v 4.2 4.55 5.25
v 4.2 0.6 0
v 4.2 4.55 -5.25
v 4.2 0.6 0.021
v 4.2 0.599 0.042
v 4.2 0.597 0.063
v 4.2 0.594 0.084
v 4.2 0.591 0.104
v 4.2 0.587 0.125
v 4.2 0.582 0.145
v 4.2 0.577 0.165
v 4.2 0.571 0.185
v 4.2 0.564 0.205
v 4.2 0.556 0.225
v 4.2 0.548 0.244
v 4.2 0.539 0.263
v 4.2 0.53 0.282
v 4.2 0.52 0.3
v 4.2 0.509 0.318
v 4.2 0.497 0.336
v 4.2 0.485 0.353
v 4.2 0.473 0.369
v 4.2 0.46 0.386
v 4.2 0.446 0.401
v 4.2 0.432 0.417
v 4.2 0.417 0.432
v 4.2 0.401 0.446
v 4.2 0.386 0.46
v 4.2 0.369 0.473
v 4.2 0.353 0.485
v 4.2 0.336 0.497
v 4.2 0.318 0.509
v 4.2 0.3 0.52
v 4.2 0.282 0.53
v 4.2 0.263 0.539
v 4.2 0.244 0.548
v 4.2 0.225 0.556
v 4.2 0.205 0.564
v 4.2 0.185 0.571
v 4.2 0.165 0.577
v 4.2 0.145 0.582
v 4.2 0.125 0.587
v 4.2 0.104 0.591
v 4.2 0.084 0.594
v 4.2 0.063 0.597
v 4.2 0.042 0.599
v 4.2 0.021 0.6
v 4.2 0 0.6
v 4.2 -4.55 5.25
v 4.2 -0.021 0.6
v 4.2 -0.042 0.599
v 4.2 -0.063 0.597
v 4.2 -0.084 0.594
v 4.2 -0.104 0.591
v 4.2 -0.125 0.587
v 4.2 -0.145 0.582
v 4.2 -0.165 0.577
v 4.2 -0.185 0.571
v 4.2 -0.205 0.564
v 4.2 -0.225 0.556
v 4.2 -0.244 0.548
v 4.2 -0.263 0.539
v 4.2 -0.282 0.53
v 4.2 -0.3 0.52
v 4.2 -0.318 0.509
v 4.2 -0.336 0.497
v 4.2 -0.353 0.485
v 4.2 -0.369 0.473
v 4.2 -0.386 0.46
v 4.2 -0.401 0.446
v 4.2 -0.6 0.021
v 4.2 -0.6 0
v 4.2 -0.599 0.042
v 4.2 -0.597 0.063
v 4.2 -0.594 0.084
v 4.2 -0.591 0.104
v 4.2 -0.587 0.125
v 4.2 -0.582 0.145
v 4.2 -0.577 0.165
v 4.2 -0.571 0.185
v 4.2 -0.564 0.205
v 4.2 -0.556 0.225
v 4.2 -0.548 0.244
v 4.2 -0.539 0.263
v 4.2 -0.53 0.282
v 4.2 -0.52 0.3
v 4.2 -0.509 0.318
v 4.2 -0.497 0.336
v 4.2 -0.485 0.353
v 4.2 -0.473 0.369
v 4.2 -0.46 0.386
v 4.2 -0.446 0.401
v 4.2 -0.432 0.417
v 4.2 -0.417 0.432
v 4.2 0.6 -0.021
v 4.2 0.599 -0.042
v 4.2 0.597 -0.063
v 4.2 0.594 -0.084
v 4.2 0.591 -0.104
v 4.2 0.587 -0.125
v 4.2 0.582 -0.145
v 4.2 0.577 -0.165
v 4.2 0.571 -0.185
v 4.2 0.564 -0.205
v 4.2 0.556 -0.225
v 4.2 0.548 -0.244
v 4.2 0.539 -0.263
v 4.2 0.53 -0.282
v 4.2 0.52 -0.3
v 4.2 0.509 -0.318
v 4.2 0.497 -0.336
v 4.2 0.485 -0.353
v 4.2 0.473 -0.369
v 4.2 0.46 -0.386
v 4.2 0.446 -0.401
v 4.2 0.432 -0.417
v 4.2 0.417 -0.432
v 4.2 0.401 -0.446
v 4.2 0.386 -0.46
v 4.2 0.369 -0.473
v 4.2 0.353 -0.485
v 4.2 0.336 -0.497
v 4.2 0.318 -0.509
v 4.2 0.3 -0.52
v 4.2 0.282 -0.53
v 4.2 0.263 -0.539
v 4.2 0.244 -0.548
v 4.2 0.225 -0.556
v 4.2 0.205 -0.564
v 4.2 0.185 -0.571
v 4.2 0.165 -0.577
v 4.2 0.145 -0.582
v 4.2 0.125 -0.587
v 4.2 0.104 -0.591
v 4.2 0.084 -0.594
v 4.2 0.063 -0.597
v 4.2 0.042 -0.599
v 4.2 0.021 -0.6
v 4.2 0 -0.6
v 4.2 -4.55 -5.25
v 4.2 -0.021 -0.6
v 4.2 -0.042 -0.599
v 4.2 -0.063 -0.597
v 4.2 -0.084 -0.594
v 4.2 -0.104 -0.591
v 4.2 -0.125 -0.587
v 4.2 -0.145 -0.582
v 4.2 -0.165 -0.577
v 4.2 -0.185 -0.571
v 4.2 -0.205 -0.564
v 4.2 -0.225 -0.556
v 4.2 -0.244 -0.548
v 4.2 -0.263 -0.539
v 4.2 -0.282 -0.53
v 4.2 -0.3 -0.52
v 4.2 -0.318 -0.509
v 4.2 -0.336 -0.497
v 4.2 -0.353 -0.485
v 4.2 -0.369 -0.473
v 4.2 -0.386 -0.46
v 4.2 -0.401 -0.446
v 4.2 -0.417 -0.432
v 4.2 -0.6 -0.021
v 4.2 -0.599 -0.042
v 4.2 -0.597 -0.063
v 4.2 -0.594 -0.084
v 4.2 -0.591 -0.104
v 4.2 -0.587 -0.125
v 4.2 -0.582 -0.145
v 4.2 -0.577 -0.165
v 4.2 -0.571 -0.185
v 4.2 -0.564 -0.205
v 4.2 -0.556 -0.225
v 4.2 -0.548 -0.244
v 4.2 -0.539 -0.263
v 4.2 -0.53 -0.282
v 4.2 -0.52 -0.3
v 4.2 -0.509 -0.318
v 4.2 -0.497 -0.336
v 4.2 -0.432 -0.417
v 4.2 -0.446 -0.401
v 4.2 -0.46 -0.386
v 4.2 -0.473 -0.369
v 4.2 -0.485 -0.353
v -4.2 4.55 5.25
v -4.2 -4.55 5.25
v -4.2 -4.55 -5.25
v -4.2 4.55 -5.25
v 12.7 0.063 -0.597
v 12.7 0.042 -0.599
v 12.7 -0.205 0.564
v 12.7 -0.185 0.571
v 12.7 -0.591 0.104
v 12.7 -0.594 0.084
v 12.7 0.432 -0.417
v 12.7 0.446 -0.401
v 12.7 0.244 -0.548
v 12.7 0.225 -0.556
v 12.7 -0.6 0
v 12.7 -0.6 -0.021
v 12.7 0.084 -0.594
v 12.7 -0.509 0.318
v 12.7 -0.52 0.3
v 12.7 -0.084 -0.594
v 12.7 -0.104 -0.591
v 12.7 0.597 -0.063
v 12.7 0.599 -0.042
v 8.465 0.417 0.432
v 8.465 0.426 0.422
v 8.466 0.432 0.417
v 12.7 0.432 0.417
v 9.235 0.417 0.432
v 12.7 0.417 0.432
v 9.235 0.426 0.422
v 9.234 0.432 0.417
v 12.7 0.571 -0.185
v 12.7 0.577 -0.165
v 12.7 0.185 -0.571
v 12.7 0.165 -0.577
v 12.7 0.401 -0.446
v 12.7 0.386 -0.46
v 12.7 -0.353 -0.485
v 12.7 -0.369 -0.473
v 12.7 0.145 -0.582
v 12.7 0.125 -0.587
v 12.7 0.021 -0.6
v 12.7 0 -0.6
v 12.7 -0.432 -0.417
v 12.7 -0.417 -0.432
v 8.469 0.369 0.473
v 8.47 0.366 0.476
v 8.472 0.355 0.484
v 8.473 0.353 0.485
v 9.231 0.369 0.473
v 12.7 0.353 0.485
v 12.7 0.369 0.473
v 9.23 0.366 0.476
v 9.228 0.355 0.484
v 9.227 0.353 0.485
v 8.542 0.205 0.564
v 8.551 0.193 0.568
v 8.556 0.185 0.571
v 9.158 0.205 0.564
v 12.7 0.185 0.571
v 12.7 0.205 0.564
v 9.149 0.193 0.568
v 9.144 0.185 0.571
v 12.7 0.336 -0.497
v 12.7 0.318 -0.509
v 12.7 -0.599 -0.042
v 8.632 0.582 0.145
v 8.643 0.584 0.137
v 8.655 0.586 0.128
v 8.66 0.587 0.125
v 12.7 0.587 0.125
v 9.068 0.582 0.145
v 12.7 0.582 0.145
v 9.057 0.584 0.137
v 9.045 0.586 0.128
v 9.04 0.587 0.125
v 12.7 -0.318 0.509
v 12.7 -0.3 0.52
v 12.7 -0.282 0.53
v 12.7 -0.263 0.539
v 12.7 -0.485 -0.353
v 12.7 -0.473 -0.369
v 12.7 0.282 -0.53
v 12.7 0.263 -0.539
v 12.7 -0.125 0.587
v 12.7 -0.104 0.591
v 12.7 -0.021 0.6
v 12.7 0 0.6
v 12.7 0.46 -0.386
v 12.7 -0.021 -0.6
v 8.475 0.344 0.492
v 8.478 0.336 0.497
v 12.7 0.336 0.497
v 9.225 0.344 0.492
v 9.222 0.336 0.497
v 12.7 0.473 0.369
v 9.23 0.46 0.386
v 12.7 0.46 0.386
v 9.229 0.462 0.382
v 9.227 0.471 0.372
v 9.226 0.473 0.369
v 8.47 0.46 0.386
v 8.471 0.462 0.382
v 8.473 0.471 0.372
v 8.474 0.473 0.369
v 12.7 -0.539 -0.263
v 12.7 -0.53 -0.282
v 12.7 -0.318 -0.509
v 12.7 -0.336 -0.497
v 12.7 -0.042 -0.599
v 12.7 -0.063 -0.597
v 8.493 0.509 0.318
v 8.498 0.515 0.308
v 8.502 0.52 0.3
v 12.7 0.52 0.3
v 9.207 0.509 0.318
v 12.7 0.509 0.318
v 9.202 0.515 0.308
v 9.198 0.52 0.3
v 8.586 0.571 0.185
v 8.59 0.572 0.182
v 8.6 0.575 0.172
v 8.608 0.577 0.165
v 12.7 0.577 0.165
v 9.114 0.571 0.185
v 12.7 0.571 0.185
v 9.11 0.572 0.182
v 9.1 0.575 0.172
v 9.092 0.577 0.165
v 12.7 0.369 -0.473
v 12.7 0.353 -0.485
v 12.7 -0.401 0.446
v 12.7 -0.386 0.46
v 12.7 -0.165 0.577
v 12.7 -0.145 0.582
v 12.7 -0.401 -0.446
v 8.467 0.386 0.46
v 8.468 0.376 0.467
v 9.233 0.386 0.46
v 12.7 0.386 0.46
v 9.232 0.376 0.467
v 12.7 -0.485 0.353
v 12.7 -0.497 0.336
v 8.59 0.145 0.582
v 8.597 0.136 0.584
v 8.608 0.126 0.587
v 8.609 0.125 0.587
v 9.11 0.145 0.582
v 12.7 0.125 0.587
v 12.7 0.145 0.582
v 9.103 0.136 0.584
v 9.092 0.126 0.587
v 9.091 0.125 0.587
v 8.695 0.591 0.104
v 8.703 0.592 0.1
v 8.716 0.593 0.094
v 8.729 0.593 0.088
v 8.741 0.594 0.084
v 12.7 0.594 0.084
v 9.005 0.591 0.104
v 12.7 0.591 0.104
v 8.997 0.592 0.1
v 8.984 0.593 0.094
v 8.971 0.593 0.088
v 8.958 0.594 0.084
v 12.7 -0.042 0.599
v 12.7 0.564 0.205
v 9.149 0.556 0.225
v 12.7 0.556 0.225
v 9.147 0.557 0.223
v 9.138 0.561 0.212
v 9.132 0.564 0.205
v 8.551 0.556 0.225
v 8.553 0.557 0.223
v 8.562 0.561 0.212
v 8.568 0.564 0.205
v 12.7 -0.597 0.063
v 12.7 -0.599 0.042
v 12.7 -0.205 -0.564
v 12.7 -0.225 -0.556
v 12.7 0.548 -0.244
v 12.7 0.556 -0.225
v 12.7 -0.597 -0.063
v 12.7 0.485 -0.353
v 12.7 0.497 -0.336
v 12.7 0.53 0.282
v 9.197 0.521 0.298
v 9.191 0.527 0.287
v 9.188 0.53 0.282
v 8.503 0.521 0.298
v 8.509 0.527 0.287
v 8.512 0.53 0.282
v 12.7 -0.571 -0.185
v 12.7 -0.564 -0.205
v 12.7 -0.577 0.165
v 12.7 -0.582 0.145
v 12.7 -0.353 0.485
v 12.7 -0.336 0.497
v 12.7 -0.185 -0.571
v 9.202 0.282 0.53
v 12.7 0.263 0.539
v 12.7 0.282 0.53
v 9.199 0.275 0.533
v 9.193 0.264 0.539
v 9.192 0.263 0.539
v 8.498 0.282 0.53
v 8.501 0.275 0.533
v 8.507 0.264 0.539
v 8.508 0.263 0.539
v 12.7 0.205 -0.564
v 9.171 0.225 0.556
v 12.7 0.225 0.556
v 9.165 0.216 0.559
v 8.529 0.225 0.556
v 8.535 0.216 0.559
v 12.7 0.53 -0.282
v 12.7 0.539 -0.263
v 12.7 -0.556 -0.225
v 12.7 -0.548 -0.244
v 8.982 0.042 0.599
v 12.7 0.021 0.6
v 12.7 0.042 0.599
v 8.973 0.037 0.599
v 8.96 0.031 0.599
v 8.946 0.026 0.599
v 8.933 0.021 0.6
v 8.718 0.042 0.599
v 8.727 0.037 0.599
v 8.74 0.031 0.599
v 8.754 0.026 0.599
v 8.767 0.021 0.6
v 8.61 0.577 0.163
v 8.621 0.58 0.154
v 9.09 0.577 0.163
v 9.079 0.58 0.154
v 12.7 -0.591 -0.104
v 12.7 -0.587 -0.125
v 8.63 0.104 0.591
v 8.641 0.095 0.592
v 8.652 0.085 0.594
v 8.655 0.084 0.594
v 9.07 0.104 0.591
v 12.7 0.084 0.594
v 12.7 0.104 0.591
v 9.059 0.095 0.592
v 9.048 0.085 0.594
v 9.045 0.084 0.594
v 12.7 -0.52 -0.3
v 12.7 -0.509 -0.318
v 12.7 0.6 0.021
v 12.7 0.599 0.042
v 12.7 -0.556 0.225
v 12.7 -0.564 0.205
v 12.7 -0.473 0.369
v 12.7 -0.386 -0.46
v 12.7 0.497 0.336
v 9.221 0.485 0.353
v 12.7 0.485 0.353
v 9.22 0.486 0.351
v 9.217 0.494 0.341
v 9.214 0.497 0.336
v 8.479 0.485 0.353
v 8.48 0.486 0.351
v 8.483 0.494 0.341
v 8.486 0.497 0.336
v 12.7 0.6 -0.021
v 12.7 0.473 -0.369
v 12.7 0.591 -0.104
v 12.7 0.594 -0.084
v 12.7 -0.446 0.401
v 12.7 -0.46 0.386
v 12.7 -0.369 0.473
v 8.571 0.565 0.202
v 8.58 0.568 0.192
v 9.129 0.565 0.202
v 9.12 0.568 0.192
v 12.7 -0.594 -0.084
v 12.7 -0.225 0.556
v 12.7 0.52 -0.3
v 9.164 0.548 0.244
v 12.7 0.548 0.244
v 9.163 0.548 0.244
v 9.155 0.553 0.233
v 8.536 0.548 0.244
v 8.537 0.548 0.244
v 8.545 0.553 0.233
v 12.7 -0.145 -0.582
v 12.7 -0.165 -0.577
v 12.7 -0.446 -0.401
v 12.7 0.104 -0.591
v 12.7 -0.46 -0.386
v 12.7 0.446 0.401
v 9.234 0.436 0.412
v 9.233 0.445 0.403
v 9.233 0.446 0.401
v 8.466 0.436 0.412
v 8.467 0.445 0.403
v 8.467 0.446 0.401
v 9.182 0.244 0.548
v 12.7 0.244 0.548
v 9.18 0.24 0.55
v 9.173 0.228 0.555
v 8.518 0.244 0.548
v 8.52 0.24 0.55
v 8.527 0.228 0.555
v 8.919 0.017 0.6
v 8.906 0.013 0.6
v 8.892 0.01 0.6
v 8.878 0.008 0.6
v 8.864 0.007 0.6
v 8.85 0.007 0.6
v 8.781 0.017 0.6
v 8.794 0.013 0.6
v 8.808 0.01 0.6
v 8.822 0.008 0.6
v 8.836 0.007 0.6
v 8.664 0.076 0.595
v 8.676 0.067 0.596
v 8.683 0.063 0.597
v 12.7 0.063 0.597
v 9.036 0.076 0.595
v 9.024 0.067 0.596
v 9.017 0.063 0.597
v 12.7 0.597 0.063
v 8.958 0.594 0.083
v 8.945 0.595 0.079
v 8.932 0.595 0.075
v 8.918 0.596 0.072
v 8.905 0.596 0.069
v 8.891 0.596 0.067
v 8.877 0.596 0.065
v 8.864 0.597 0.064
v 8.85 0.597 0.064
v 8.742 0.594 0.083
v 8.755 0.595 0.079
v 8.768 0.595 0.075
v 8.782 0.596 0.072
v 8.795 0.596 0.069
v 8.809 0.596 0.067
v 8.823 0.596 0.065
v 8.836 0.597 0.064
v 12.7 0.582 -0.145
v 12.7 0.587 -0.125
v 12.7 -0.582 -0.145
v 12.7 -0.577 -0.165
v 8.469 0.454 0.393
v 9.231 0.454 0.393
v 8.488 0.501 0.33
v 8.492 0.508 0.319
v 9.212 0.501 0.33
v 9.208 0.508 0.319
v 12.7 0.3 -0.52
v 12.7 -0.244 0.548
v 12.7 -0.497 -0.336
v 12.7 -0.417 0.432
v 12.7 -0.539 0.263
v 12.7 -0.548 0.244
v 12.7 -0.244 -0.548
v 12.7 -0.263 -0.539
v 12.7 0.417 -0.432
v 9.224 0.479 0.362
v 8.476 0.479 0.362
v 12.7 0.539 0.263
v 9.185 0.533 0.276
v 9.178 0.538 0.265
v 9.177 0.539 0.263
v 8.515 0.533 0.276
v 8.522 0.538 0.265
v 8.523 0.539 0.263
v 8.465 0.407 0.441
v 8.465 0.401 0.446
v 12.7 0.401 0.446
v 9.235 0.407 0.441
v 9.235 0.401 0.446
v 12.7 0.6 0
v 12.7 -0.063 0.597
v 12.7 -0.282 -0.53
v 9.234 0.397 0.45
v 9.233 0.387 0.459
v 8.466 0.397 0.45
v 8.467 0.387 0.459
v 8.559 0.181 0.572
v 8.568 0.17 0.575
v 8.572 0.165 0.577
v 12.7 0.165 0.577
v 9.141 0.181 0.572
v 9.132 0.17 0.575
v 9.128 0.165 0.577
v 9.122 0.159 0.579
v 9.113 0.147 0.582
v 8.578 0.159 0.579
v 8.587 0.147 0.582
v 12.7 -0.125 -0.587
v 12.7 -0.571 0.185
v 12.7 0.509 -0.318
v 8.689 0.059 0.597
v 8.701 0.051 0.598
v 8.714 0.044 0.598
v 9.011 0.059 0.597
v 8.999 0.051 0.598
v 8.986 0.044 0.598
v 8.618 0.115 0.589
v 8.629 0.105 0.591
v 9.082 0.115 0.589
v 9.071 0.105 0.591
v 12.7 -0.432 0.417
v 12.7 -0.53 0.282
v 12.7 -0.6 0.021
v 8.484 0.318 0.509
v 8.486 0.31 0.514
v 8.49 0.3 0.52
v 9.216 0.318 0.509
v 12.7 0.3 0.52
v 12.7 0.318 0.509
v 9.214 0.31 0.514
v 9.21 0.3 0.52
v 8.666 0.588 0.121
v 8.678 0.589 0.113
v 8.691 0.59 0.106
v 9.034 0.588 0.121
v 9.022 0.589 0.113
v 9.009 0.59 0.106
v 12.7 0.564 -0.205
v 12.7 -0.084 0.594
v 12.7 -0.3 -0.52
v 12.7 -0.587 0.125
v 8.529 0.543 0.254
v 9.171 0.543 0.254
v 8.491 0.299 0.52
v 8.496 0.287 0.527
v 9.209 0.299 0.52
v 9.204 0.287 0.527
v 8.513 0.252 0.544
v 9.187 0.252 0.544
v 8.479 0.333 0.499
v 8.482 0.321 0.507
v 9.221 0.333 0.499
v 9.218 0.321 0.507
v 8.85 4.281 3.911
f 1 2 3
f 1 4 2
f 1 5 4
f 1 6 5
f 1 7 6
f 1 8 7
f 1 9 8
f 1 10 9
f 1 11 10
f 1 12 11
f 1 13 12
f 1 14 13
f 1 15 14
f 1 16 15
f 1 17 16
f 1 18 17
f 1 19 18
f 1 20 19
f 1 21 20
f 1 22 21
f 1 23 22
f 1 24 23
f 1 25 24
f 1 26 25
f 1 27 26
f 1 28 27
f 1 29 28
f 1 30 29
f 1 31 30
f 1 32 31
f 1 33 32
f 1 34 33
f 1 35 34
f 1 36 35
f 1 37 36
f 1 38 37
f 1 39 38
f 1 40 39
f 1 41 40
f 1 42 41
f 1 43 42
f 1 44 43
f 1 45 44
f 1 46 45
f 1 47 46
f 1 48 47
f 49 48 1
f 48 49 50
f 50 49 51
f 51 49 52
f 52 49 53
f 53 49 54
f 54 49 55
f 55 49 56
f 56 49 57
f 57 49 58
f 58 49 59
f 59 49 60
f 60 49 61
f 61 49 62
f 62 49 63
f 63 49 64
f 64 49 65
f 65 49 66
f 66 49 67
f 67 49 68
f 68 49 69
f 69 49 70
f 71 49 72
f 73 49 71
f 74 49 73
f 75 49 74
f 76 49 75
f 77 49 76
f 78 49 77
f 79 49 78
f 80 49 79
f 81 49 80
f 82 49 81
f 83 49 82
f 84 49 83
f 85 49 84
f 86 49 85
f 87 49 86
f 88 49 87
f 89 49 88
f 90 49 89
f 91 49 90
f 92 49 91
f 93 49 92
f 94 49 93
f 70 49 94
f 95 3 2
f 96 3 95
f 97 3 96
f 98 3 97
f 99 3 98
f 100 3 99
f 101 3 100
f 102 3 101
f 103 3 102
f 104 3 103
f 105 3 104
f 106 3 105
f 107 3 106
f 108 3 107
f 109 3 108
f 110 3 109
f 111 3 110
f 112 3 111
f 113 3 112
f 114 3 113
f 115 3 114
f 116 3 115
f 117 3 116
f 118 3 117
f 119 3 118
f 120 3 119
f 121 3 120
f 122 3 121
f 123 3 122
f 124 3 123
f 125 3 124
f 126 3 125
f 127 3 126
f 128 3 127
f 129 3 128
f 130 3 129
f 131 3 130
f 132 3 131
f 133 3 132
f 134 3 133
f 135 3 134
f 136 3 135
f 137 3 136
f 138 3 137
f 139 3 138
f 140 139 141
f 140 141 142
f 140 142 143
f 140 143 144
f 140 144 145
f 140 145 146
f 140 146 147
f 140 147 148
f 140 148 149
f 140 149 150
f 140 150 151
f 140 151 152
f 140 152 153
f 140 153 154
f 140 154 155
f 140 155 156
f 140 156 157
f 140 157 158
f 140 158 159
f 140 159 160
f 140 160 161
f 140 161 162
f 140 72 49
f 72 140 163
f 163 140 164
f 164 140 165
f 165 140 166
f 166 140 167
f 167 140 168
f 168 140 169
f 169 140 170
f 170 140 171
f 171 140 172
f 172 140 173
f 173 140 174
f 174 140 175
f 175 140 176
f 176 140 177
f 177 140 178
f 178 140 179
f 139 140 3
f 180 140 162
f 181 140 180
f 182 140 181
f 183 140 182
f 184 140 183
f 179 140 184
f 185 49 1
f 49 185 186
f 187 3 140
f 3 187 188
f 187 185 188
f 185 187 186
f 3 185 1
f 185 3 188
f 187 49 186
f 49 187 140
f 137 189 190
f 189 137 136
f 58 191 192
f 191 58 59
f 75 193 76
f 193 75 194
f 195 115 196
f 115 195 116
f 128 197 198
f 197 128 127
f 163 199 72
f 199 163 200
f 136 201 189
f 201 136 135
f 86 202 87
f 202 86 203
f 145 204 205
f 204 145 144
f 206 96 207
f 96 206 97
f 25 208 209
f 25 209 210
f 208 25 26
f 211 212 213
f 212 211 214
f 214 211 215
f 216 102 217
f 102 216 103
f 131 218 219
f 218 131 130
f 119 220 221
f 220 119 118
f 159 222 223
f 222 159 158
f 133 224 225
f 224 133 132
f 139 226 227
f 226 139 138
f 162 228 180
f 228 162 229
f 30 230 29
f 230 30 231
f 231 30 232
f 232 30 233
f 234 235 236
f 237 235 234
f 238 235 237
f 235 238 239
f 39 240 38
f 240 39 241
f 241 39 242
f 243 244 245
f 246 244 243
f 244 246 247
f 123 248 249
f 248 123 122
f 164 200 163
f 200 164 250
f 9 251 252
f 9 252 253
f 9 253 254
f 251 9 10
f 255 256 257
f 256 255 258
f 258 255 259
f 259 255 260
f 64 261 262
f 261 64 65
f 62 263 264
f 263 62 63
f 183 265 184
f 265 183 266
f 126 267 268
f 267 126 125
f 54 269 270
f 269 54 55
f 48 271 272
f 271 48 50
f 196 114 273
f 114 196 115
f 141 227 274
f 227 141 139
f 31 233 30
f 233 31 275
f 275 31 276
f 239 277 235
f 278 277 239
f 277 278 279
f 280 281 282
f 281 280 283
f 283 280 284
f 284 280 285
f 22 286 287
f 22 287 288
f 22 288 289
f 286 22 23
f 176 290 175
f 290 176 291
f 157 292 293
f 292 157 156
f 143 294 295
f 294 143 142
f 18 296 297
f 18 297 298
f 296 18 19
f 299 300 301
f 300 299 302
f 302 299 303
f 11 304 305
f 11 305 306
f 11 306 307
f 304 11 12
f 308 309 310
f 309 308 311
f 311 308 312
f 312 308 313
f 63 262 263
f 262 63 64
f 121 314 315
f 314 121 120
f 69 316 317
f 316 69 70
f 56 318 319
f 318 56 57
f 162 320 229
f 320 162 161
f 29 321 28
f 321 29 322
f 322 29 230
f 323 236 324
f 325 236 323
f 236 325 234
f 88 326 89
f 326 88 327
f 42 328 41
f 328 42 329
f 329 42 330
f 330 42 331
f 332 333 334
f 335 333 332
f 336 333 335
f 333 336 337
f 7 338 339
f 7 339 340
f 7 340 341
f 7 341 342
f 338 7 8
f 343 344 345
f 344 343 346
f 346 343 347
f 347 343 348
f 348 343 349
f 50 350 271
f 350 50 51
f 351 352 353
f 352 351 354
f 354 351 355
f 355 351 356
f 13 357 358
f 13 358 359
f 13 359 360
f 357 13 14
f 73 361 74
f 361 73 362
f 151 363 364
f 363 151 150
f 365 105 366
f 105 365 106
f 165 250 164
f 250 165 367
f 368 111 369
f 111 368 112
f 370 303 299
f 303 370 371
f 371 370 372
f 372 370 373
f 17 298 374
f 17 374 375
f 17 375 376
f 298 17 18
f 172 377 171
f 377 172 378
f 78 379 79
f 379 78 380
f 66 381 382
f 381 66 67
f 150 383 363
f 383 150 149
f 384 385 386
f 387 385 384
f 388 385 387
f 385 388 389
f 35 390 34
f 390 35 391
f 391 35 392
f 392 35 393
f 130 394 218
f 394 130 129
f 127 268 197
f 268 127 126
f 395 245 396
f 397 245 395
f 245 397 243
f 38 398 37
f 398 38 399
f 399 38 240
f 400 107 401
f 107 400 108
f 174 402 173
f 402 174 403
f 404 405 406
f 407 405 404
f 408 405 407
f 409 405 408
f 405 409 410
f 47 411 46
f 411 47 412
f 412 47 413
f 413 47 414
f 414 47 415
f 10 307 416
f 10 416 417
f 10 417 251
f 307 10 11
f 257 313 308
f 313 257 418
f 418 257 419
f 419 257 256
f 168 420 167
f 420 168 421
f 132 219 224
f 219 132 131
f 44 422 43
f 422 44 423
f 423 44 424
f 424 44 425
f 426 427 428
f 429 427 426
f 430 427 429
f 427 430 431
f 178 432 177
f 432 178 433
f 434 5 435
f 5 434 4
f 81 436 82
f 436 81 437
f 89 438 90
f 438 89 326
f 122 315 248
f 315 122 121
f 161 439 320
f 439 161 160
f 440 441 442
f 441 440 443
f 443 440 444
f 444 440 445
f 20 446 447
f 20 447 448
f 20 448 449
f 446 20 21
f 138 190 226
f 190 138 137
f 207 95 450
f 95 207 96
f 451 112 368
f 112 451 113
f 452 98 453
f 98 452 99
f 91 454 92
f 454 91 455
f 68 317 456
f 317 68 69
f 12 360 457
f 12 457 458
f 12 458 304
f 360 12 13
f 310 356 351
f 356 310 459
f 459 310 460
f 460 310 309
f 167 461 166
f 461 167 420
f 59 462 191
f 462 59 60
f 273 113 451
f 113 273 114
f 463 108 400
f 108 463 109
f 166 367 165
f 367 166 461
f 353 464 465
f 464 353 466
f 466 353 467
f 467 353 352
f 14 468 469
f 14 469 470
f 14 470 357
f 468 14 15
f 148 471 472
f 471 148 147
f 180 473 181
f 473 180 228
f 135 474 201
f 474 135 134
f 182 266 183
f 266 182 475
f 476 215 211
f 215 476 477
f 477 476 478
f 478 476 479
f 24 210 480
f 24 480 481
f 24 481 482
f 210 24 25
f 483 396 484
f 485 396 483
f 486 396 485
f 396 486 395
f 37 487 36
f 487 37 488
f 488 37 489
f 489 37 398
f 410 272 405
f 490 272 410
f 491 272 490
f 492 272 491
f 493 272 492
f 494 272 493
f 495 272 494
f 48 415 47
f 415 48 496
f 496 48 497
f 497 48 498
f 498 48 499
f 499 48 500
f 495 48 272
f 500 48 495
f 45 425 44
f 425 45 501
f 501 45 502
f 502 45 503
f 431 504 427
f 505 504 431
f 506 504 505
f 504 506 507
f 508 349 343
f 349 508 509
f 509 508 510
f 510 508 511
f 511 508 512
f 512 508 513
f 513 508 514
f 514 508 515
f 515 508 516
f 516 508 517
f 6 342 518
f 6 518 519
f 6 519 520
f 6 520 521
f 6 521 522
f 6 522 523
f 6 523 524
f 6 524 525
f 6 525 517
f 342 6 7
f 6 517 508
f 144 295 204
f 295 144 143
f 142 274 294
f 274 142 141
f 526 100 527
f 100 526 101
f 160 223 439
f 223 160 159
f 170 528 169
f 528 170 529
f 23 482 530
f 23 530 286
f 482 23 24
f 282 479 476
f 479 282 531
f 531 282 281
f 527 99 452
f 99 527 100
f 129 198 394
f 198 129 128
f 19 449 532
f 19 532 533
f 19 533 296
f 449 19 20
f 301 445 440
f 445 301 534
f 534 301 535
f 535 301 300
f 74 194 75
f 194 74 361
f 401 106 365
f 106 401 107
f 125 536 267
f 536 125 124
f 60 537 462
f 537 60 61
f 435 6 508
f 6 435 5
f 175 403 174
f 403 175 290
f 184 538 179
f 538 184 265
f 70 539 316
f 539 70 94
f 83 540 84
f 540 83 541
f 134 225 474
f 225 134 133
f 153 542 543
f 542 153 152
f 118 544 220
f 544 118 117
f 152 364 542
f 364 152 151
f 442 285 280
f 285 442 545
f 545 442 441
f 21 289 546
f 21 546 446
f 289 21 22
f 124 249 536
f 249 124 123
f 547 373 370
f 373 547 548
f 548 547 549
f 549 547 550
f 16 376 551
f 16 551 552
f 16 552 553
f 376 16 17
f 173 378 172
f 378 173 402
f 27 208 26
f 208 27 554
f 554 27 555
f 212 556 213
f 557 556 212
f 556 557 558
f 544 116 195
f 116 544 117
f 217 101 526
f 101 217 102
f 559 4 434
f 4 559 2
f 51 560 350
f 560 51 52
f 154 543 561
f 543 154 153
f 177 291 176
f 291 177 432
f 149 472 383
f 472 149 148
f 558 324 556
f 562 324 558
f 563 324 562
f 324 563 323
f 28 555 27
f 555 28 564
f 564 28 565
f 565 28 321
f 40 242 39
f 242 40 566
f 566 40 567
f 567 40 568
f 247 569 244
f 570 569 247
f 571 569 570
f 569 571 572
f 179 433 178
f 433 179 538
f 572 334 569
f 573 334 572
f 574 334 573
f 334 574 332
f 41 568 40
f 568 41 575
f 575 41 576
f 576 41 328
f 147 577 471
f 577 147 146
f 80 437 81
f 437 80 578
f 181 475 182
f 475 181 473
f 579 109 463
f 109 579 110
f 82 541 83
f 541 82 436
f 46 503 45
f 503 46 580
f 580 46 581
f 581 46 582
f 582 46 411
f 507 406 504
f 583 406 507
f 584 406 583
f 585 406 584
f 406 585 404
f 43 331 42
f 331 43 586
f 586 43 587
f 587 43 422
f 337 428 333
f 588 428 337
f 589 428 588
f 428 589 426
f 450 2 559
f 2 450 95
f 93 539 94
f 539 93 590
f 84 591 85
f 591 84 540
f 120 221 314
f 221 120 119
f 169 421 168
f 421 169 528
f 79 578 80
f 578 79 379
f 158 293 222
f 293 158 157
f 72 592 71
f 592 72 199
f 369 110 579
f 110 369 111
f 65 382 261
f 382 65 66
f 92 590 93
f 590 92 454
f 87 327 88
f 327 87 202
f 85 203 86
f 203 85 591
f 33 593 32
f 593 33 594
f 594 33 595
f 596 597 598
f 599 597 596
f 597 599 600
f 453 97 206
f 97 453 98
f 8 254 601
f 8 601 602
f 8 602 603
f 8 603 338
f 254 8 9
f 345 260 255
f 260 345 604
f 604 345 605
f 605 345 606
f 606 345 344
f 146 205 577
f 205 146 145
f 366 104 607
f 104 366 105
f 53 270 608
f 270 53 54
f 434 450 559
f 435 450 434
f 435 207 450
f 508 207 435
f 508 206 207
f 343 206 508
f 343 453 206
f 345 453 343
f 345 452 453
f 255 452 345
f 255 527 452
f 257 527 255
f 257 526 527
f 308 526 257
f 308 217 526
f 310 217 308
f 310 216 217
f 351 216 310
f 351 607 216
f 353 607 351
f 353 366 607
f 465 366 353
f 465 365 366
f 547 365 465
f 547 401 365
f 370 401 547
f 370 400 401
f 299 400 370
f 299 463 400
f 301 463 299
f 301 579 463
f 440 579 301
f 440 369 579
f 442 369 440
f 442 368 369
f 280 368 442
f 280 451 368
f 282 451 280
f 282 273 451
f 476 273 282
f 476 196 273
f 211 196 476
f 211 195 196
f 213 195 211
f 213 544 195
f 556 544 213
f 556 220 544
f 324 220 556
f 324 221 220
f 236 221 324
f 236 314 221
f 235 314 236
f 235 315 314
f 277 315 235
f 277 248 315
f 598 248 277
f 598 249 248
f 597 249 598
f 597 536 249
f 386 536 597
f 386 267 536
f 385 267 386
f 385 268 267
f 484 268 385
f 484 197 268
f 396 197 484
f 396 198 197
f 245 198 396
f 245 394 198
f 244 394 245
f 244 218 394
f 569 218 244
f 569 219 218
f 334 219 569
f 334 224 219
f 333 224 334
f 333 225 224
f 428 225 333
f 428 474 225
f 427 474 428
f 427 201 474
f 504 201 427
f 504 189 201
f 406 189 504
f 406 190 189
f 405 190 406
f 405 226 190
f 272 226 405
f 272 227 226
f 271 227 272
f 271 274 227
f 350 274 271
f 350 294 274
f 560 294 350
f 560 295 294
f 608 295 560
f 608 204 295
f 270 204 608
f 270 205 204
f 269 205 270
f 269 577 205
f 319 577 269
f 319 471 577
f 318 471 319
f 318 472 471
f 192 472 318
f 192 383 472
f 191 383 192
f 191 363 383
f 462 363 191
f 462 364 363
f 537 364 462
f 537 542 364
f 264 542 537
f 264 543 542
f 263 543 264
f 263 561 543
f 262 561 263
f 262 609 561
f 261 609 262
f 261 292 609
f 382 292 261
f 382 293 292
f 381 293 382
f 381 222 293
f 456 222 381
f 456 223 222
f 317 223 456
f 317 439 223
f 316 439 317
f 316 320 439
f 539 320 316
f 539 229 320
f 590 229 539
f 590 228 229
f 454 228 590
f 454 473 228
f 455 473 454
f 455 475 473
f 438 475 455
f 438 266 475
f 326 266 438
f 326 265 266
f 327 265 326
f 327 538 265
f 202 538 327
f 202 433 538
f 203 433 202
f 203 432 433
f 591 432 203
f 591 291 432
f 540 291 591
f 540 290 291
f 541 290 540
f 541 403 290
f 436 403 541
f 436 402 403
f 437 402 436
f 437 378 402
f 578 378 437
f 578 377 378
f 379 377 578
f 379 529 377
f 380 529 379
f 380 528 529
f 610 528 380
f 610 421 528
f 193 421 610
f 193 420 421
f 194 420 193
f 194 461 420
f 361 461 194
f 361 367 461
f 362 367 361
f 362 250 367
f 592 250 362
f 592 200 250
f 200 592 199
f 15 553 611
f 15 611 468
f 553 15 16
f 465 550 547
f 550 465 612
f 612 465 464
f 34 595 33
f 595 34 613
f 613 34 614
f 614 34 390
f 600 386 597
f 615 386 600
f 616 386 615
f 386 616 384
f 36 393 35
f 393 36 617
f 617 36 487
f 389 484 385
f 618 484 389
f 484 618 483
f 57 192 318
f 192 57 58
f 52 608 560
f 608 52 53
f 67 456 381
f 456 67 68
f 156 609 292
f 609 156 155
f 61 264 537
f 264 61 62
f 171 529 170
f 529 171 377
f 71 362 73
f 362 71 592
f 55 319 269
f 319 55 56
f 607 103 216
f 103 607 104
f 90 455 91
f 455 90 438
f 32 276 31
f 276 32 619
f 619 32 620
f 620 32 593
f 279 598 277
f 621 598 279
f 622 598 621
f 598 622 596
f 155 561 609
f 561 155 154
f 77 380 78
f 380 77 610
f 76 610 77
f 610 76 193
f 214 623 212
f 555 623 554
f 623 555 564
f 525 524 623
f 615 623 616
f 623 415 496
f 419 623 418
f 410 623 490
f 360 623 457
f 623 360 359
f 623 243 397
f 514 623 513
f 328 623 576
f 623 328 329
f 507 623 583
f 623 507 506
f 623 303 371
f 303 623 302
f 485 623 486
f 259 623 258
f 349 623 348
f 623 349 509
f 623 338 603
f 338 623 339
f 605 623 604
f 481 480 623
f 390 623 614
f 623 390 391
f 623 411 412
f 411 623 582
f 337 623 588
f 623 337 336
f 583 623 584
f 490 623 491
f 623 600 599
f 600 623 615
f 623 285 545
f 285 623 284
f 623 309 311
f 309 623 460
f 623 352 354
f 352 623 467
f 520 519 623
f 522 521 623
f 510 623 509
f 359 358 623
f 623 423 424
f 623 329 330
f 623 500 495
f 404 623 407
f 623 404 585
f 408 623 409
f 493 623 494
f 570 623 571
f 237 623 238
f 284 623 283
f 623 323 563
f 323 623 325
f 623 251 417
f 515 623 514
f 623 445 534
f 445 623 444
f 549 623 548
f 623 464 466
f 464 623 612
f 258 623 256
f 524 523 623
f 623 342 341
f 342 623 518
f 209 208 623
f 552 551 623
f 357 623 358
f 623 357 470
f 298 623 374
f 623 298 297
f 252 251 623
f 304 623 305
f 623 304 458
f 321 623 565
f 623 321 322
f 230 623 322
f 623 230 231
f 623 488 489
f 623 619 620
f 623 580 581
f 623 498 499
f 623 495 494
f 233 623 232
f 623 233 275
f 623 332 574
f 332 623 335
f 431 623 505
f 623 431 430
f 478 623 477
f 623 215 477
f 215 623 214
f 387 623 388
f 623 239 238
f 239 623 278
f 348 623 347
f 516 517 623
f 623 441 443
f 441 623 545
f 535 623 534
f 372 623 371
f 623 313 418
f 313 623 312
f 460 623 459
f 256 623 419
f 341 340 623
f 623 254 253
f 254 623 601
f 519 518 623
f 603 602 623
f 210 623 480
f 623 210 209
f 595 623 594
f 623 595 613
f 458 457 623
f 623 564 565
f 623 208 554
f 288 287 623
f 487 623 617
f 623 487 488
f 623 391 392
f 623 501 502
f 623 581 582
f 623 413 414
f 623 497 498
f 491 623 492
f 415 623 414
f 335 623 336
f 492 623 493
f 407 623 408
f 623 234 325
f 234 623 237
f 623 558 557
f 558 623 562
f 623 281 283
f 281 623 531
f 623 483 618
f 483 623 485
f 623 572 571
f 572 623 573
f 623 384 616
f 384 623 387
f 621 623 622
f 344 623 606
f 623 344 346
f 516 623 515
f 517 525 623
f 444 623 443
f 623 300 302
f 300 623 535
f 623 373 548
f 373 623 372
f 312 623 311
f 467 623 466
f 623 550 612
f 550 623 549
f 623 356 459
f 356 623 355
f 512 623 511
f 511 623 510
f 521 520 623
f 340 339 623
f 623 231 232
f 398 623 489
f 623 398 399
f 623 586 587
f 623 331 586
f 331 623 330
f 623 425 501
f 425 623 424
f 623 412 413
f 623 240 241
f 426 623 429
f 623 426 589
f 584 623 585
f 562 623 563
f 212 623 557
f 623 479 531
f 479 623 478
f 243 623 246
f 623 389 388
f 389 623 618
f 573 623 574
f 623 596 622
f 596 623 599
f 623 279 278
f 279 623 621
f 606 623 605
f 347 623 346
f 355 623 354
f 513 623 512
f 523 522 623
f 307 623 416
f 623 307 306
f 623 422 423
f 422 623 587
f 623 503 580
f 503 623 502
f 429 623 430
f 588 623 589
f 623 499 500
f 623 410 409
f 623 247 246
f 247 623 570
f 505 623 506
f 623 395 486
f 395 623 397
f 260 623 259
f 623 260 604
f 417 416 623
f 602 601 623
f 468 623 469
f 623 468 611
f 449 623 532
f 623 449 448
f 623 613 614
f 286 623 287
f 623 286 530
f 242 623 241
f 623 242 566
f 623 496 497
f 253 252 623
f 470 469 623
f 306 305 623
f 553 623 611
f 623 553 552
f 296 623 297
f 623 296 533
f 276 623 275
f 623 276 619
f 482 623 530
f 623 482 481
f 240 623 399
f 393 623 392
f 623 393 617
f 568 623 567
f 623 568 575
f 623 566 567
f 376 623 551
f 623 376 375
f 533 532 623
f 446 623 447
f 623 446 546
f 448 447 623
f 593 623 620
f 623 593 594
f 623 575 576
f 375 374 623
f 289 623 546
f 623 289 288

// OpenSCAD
include <../api/box.scad>

$fn = 180;

mainBoxSize = [8.4, 9.1, 10.5];
cylinderXSize = [8.5, 1.2, 1.2];
cylinderYSize = [0.8, 5.4, 0.8];
cylinderYRotation = [ 42, 0, 0];

mainBox = boxCreate ( mainBoxSize );
cylinderX = boxMoveLeftTo ( boxCreate ( cylinderXSize ), mainBox[ixmax] );
cylinderY = boxMoveFrontTo (
    boxMoveBottomTo (
        boxMoveLeftTo (
            boxRotate (
                boxCreate ( cylinderYSize )
                , cylinderYRotation )
            , cylinderX[ix] )
        , cylinderX[iy] )
    , cylinderX[iz]
);

color ( "White" )
boxRenderCube ( mainBox );

color ( "Red" )
boxRenderCylinderX ( cylinderX );

color ( "Green" )
boxRenderConeBack ( cylinderY );
